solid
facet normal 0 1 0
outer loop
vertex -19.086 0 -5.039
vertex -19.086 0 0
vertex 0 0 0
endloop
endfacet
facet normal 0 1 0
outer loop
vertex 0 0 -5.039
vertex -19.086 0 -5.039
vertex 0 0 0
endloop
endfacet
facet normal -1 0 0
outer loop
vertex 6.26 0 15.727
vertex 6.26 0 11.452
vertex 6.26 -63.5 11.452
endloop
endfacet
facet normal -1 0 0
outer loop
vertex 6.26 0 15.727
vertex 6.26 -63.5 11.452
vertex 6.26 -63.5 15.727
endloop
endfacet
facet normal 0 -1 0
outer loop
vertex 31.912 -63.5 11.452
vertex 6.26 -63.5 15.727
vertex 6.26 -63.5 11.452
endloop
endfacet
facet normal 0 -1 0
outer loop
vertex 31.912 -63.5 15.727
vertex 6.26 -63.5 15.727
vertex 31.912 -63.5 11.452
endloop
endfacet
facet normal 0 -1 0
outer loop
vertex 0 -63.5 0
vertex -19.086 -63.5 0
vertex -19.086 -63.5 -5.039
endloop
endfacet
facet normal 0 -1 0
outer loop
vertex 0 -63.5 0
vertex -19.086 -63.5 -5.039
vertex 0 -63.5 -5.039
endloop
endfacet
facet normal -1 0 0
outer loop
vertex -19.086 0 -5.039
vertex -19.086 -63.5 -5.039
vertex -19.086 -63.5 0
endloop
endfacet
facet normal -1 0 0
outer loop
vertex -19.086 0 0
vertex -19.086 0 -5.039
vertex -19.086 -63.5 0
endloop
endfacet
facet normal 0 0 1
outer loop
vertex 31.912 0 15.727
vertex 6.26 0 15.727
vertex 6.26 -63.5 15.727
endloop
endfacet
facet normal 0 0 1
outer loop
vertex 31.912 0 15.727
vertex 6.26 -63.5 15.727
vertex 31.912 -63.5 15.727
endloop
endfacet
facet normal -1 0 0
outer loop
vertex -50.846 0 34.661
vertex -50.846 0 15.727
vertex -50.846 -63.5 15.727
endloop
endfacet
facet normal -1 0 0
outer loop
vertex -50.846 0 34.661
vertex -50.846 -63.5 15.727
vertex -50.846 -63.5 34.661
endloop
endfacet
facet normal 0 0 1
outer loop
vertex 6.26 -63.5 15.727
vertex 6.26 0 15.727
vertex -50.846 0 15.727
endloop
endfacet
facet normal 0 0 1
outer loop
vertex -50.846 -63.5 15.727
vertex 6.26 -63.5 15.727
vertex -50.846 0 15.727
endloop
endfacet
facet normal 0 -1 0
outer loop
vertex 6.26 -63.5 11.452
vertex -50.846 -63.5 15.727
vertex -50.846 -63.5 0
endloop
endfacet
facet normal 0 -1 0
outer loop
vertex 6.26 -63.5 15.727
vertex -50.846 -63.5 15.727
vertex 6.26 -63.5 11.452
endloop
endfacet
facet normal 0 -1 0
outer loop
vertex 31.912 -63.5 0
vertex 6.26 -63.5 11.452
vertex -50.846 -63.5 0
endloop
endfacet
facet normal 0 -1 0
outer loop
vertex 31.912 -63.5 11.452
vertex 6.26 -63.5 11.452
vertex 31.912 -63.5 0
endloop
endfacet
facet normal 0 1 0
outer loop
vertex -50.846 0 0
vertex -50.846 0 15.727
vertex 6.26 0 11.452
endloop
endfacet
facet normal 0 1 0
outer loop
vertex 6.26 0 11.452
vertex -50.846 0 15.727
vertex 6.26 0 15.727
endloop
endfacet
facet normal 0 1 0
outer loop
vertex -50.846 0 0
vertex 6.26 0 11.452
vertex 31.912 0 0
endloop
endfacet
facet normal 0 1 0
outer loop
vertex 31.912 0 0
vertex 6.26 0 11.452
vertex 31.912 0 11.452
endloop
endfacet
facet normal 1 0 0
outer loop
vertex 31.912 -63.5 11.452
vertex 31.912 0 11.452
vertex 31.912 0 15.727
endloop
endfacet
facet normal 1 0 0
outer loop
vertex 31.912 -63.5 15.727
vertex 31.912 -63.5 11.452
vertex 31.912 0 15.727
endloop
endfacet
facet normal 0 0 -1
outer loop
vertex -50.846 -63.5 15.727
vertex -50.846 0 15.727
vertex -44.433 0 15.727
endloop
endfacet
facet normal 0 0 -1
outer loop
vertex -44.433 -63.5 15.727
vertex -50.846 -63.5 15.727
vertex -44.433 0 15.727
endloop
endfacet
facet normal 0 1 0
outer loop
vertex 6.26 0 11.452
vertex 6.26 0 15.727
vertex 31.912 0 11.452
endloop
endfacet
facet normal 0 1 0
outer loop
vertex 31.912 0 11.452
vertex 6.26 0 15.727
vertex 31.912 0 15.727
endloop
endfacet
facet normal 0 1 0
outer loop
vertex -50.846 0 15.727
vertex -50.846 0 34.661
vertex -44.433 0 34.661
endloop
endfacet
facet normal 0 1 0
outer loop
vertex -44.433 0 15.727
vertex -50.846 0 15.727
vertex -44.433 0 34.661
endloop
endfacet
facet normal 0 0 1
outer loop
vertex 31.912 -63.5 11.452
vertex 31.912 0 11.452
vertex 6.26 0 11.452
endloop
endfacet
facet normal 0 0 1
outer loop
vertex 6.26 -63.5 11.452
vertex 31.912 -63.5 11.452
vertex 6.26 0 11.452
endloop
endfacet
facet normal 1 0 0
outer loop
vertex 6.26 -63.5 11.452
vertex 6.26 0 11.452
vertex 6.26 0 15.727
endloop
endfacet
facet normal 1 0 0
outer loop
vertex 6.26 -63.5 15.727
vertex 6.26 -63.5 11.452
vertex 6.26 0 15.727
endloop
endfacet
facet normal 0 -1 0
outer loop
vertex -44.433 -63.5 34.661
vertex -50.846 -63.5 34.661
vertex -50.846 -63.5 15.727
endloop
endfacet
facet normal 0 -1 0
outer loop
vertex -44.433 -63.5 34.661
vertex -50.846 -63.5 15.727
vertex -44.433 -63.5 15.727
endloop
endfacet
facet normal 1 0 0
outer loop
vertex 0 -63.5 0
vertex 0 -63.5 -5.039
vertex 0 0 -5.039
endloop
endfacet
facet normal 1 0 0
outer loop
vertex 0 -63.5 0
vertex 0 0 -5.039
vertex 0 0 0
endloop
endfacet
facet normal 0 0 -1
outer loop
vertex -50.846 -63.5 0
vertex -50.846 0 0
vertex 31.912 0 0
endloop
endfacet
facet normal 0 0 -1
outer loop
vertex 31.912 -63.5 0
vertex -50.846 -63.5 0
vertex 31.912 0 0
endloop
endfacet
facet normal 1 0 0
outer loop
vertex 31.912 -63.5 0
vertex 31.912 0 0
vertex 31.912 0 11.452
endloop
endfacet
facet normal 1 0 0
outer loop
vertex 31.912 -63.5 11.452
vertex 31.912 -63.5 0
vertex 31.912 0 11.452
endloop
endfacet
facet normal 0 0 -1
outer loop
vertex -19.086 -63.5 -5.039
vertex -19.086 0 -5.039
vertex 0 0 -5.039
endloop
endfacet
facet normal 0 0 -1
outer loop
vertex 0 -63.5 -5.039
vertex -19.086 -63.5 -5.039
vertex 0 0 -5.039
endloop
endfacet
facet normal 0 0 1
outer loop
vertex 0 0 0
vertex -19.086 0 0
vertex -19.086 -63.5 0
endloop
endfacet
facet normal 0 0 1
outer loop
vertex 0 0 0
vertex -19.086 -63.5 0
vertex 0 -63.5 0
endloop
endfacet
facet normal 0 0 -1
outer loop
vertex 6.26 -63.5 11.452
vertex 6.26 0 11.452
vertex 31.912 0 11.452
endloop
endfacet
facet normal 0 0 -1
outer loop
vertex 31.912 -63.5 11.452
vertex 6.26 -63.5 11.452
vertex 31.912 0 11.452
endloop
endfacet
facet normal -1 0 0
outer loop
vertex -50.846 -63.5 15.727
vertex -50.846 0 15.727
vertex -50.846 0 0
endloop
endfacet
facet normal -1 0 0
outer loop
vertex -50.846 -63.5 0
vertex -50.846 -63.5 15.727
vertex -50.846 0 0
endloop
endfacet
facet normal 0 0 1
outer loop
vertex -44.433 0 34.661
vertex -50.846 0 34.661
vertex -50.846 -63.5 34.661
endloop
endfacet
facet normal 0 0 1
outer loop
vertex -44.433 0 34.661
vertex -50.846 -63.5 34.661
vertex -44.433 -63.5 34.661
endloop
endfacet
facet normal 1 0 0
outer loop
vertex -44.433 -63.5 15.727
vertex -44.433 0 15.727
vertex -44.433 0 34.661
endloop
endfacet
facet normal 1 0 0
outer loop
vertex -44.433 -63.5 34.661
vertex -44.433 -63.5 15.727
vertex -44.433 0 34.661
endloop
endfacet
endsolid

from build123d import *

# Parameters (mm, degrees)
F0_W     = 19.0863553435
F0_H     = 5.0387978554
F1_DEPTH = 63.5
F0_W_2   = 6.4130164683
F0_H_2   = 18.9336631447
F2_DEPTH = 63.5
F3_DEPTH = 63.5
F0_W_3   = 25.6520579569
F0_H_3   = 4.2753443122
F4_DEPTH = 63.5


with BuildPart() as f1:
    # F0 (on Front) → F1 (new body)
    with BuildSketch(Plane.XZ):
        with Locations((-9.5431776717, -2.5193989277)):
            Rectangle(F0_W, F0_H)
    extrude(amount=F1_DEPTH)


with BuildPart() as f2:
    # F0 (on Front) → F2 (new body)
    with BuildSketch(Plane.XZ):
        with Locations((-47.6395431906, 25.1939883456)):
            Rectangle(F0_W_2, F0_H_2)
    extrude(amount=F2_DEPTH)


with BuildPart() as f3:
    # F0 (on Front) → F3 (new body)
    with BuildSketch(Plane.XZ):
        Polygon((-19.0863553435, 0), (0, 0), (31.9123826921, 0), (31.9123826921, 11.451812461), (6.2603247352, 11.451812461), (6.2603247352, 15.7271567732), (0, 15.7271567732), (-44.4330349565, 15.7271567732), (-50.8460514247, 15.7271567732), (-50.8460514247, 0), align=None)
    extrude(amount=F3_DEPTH)


with BuildPart() as f4:
    # F0 (on Front) → F4 (new body)
    with BuildSketch(Plane.XZ):
        with Locations((19.0863537136, 13.5894846171)):
            Rectangle(F0_W_3, F0_H_3)
    extrude(amount=F4_DEPTH)


solid = Compound([f1.part, f2.part, f3.part, f4.part])
